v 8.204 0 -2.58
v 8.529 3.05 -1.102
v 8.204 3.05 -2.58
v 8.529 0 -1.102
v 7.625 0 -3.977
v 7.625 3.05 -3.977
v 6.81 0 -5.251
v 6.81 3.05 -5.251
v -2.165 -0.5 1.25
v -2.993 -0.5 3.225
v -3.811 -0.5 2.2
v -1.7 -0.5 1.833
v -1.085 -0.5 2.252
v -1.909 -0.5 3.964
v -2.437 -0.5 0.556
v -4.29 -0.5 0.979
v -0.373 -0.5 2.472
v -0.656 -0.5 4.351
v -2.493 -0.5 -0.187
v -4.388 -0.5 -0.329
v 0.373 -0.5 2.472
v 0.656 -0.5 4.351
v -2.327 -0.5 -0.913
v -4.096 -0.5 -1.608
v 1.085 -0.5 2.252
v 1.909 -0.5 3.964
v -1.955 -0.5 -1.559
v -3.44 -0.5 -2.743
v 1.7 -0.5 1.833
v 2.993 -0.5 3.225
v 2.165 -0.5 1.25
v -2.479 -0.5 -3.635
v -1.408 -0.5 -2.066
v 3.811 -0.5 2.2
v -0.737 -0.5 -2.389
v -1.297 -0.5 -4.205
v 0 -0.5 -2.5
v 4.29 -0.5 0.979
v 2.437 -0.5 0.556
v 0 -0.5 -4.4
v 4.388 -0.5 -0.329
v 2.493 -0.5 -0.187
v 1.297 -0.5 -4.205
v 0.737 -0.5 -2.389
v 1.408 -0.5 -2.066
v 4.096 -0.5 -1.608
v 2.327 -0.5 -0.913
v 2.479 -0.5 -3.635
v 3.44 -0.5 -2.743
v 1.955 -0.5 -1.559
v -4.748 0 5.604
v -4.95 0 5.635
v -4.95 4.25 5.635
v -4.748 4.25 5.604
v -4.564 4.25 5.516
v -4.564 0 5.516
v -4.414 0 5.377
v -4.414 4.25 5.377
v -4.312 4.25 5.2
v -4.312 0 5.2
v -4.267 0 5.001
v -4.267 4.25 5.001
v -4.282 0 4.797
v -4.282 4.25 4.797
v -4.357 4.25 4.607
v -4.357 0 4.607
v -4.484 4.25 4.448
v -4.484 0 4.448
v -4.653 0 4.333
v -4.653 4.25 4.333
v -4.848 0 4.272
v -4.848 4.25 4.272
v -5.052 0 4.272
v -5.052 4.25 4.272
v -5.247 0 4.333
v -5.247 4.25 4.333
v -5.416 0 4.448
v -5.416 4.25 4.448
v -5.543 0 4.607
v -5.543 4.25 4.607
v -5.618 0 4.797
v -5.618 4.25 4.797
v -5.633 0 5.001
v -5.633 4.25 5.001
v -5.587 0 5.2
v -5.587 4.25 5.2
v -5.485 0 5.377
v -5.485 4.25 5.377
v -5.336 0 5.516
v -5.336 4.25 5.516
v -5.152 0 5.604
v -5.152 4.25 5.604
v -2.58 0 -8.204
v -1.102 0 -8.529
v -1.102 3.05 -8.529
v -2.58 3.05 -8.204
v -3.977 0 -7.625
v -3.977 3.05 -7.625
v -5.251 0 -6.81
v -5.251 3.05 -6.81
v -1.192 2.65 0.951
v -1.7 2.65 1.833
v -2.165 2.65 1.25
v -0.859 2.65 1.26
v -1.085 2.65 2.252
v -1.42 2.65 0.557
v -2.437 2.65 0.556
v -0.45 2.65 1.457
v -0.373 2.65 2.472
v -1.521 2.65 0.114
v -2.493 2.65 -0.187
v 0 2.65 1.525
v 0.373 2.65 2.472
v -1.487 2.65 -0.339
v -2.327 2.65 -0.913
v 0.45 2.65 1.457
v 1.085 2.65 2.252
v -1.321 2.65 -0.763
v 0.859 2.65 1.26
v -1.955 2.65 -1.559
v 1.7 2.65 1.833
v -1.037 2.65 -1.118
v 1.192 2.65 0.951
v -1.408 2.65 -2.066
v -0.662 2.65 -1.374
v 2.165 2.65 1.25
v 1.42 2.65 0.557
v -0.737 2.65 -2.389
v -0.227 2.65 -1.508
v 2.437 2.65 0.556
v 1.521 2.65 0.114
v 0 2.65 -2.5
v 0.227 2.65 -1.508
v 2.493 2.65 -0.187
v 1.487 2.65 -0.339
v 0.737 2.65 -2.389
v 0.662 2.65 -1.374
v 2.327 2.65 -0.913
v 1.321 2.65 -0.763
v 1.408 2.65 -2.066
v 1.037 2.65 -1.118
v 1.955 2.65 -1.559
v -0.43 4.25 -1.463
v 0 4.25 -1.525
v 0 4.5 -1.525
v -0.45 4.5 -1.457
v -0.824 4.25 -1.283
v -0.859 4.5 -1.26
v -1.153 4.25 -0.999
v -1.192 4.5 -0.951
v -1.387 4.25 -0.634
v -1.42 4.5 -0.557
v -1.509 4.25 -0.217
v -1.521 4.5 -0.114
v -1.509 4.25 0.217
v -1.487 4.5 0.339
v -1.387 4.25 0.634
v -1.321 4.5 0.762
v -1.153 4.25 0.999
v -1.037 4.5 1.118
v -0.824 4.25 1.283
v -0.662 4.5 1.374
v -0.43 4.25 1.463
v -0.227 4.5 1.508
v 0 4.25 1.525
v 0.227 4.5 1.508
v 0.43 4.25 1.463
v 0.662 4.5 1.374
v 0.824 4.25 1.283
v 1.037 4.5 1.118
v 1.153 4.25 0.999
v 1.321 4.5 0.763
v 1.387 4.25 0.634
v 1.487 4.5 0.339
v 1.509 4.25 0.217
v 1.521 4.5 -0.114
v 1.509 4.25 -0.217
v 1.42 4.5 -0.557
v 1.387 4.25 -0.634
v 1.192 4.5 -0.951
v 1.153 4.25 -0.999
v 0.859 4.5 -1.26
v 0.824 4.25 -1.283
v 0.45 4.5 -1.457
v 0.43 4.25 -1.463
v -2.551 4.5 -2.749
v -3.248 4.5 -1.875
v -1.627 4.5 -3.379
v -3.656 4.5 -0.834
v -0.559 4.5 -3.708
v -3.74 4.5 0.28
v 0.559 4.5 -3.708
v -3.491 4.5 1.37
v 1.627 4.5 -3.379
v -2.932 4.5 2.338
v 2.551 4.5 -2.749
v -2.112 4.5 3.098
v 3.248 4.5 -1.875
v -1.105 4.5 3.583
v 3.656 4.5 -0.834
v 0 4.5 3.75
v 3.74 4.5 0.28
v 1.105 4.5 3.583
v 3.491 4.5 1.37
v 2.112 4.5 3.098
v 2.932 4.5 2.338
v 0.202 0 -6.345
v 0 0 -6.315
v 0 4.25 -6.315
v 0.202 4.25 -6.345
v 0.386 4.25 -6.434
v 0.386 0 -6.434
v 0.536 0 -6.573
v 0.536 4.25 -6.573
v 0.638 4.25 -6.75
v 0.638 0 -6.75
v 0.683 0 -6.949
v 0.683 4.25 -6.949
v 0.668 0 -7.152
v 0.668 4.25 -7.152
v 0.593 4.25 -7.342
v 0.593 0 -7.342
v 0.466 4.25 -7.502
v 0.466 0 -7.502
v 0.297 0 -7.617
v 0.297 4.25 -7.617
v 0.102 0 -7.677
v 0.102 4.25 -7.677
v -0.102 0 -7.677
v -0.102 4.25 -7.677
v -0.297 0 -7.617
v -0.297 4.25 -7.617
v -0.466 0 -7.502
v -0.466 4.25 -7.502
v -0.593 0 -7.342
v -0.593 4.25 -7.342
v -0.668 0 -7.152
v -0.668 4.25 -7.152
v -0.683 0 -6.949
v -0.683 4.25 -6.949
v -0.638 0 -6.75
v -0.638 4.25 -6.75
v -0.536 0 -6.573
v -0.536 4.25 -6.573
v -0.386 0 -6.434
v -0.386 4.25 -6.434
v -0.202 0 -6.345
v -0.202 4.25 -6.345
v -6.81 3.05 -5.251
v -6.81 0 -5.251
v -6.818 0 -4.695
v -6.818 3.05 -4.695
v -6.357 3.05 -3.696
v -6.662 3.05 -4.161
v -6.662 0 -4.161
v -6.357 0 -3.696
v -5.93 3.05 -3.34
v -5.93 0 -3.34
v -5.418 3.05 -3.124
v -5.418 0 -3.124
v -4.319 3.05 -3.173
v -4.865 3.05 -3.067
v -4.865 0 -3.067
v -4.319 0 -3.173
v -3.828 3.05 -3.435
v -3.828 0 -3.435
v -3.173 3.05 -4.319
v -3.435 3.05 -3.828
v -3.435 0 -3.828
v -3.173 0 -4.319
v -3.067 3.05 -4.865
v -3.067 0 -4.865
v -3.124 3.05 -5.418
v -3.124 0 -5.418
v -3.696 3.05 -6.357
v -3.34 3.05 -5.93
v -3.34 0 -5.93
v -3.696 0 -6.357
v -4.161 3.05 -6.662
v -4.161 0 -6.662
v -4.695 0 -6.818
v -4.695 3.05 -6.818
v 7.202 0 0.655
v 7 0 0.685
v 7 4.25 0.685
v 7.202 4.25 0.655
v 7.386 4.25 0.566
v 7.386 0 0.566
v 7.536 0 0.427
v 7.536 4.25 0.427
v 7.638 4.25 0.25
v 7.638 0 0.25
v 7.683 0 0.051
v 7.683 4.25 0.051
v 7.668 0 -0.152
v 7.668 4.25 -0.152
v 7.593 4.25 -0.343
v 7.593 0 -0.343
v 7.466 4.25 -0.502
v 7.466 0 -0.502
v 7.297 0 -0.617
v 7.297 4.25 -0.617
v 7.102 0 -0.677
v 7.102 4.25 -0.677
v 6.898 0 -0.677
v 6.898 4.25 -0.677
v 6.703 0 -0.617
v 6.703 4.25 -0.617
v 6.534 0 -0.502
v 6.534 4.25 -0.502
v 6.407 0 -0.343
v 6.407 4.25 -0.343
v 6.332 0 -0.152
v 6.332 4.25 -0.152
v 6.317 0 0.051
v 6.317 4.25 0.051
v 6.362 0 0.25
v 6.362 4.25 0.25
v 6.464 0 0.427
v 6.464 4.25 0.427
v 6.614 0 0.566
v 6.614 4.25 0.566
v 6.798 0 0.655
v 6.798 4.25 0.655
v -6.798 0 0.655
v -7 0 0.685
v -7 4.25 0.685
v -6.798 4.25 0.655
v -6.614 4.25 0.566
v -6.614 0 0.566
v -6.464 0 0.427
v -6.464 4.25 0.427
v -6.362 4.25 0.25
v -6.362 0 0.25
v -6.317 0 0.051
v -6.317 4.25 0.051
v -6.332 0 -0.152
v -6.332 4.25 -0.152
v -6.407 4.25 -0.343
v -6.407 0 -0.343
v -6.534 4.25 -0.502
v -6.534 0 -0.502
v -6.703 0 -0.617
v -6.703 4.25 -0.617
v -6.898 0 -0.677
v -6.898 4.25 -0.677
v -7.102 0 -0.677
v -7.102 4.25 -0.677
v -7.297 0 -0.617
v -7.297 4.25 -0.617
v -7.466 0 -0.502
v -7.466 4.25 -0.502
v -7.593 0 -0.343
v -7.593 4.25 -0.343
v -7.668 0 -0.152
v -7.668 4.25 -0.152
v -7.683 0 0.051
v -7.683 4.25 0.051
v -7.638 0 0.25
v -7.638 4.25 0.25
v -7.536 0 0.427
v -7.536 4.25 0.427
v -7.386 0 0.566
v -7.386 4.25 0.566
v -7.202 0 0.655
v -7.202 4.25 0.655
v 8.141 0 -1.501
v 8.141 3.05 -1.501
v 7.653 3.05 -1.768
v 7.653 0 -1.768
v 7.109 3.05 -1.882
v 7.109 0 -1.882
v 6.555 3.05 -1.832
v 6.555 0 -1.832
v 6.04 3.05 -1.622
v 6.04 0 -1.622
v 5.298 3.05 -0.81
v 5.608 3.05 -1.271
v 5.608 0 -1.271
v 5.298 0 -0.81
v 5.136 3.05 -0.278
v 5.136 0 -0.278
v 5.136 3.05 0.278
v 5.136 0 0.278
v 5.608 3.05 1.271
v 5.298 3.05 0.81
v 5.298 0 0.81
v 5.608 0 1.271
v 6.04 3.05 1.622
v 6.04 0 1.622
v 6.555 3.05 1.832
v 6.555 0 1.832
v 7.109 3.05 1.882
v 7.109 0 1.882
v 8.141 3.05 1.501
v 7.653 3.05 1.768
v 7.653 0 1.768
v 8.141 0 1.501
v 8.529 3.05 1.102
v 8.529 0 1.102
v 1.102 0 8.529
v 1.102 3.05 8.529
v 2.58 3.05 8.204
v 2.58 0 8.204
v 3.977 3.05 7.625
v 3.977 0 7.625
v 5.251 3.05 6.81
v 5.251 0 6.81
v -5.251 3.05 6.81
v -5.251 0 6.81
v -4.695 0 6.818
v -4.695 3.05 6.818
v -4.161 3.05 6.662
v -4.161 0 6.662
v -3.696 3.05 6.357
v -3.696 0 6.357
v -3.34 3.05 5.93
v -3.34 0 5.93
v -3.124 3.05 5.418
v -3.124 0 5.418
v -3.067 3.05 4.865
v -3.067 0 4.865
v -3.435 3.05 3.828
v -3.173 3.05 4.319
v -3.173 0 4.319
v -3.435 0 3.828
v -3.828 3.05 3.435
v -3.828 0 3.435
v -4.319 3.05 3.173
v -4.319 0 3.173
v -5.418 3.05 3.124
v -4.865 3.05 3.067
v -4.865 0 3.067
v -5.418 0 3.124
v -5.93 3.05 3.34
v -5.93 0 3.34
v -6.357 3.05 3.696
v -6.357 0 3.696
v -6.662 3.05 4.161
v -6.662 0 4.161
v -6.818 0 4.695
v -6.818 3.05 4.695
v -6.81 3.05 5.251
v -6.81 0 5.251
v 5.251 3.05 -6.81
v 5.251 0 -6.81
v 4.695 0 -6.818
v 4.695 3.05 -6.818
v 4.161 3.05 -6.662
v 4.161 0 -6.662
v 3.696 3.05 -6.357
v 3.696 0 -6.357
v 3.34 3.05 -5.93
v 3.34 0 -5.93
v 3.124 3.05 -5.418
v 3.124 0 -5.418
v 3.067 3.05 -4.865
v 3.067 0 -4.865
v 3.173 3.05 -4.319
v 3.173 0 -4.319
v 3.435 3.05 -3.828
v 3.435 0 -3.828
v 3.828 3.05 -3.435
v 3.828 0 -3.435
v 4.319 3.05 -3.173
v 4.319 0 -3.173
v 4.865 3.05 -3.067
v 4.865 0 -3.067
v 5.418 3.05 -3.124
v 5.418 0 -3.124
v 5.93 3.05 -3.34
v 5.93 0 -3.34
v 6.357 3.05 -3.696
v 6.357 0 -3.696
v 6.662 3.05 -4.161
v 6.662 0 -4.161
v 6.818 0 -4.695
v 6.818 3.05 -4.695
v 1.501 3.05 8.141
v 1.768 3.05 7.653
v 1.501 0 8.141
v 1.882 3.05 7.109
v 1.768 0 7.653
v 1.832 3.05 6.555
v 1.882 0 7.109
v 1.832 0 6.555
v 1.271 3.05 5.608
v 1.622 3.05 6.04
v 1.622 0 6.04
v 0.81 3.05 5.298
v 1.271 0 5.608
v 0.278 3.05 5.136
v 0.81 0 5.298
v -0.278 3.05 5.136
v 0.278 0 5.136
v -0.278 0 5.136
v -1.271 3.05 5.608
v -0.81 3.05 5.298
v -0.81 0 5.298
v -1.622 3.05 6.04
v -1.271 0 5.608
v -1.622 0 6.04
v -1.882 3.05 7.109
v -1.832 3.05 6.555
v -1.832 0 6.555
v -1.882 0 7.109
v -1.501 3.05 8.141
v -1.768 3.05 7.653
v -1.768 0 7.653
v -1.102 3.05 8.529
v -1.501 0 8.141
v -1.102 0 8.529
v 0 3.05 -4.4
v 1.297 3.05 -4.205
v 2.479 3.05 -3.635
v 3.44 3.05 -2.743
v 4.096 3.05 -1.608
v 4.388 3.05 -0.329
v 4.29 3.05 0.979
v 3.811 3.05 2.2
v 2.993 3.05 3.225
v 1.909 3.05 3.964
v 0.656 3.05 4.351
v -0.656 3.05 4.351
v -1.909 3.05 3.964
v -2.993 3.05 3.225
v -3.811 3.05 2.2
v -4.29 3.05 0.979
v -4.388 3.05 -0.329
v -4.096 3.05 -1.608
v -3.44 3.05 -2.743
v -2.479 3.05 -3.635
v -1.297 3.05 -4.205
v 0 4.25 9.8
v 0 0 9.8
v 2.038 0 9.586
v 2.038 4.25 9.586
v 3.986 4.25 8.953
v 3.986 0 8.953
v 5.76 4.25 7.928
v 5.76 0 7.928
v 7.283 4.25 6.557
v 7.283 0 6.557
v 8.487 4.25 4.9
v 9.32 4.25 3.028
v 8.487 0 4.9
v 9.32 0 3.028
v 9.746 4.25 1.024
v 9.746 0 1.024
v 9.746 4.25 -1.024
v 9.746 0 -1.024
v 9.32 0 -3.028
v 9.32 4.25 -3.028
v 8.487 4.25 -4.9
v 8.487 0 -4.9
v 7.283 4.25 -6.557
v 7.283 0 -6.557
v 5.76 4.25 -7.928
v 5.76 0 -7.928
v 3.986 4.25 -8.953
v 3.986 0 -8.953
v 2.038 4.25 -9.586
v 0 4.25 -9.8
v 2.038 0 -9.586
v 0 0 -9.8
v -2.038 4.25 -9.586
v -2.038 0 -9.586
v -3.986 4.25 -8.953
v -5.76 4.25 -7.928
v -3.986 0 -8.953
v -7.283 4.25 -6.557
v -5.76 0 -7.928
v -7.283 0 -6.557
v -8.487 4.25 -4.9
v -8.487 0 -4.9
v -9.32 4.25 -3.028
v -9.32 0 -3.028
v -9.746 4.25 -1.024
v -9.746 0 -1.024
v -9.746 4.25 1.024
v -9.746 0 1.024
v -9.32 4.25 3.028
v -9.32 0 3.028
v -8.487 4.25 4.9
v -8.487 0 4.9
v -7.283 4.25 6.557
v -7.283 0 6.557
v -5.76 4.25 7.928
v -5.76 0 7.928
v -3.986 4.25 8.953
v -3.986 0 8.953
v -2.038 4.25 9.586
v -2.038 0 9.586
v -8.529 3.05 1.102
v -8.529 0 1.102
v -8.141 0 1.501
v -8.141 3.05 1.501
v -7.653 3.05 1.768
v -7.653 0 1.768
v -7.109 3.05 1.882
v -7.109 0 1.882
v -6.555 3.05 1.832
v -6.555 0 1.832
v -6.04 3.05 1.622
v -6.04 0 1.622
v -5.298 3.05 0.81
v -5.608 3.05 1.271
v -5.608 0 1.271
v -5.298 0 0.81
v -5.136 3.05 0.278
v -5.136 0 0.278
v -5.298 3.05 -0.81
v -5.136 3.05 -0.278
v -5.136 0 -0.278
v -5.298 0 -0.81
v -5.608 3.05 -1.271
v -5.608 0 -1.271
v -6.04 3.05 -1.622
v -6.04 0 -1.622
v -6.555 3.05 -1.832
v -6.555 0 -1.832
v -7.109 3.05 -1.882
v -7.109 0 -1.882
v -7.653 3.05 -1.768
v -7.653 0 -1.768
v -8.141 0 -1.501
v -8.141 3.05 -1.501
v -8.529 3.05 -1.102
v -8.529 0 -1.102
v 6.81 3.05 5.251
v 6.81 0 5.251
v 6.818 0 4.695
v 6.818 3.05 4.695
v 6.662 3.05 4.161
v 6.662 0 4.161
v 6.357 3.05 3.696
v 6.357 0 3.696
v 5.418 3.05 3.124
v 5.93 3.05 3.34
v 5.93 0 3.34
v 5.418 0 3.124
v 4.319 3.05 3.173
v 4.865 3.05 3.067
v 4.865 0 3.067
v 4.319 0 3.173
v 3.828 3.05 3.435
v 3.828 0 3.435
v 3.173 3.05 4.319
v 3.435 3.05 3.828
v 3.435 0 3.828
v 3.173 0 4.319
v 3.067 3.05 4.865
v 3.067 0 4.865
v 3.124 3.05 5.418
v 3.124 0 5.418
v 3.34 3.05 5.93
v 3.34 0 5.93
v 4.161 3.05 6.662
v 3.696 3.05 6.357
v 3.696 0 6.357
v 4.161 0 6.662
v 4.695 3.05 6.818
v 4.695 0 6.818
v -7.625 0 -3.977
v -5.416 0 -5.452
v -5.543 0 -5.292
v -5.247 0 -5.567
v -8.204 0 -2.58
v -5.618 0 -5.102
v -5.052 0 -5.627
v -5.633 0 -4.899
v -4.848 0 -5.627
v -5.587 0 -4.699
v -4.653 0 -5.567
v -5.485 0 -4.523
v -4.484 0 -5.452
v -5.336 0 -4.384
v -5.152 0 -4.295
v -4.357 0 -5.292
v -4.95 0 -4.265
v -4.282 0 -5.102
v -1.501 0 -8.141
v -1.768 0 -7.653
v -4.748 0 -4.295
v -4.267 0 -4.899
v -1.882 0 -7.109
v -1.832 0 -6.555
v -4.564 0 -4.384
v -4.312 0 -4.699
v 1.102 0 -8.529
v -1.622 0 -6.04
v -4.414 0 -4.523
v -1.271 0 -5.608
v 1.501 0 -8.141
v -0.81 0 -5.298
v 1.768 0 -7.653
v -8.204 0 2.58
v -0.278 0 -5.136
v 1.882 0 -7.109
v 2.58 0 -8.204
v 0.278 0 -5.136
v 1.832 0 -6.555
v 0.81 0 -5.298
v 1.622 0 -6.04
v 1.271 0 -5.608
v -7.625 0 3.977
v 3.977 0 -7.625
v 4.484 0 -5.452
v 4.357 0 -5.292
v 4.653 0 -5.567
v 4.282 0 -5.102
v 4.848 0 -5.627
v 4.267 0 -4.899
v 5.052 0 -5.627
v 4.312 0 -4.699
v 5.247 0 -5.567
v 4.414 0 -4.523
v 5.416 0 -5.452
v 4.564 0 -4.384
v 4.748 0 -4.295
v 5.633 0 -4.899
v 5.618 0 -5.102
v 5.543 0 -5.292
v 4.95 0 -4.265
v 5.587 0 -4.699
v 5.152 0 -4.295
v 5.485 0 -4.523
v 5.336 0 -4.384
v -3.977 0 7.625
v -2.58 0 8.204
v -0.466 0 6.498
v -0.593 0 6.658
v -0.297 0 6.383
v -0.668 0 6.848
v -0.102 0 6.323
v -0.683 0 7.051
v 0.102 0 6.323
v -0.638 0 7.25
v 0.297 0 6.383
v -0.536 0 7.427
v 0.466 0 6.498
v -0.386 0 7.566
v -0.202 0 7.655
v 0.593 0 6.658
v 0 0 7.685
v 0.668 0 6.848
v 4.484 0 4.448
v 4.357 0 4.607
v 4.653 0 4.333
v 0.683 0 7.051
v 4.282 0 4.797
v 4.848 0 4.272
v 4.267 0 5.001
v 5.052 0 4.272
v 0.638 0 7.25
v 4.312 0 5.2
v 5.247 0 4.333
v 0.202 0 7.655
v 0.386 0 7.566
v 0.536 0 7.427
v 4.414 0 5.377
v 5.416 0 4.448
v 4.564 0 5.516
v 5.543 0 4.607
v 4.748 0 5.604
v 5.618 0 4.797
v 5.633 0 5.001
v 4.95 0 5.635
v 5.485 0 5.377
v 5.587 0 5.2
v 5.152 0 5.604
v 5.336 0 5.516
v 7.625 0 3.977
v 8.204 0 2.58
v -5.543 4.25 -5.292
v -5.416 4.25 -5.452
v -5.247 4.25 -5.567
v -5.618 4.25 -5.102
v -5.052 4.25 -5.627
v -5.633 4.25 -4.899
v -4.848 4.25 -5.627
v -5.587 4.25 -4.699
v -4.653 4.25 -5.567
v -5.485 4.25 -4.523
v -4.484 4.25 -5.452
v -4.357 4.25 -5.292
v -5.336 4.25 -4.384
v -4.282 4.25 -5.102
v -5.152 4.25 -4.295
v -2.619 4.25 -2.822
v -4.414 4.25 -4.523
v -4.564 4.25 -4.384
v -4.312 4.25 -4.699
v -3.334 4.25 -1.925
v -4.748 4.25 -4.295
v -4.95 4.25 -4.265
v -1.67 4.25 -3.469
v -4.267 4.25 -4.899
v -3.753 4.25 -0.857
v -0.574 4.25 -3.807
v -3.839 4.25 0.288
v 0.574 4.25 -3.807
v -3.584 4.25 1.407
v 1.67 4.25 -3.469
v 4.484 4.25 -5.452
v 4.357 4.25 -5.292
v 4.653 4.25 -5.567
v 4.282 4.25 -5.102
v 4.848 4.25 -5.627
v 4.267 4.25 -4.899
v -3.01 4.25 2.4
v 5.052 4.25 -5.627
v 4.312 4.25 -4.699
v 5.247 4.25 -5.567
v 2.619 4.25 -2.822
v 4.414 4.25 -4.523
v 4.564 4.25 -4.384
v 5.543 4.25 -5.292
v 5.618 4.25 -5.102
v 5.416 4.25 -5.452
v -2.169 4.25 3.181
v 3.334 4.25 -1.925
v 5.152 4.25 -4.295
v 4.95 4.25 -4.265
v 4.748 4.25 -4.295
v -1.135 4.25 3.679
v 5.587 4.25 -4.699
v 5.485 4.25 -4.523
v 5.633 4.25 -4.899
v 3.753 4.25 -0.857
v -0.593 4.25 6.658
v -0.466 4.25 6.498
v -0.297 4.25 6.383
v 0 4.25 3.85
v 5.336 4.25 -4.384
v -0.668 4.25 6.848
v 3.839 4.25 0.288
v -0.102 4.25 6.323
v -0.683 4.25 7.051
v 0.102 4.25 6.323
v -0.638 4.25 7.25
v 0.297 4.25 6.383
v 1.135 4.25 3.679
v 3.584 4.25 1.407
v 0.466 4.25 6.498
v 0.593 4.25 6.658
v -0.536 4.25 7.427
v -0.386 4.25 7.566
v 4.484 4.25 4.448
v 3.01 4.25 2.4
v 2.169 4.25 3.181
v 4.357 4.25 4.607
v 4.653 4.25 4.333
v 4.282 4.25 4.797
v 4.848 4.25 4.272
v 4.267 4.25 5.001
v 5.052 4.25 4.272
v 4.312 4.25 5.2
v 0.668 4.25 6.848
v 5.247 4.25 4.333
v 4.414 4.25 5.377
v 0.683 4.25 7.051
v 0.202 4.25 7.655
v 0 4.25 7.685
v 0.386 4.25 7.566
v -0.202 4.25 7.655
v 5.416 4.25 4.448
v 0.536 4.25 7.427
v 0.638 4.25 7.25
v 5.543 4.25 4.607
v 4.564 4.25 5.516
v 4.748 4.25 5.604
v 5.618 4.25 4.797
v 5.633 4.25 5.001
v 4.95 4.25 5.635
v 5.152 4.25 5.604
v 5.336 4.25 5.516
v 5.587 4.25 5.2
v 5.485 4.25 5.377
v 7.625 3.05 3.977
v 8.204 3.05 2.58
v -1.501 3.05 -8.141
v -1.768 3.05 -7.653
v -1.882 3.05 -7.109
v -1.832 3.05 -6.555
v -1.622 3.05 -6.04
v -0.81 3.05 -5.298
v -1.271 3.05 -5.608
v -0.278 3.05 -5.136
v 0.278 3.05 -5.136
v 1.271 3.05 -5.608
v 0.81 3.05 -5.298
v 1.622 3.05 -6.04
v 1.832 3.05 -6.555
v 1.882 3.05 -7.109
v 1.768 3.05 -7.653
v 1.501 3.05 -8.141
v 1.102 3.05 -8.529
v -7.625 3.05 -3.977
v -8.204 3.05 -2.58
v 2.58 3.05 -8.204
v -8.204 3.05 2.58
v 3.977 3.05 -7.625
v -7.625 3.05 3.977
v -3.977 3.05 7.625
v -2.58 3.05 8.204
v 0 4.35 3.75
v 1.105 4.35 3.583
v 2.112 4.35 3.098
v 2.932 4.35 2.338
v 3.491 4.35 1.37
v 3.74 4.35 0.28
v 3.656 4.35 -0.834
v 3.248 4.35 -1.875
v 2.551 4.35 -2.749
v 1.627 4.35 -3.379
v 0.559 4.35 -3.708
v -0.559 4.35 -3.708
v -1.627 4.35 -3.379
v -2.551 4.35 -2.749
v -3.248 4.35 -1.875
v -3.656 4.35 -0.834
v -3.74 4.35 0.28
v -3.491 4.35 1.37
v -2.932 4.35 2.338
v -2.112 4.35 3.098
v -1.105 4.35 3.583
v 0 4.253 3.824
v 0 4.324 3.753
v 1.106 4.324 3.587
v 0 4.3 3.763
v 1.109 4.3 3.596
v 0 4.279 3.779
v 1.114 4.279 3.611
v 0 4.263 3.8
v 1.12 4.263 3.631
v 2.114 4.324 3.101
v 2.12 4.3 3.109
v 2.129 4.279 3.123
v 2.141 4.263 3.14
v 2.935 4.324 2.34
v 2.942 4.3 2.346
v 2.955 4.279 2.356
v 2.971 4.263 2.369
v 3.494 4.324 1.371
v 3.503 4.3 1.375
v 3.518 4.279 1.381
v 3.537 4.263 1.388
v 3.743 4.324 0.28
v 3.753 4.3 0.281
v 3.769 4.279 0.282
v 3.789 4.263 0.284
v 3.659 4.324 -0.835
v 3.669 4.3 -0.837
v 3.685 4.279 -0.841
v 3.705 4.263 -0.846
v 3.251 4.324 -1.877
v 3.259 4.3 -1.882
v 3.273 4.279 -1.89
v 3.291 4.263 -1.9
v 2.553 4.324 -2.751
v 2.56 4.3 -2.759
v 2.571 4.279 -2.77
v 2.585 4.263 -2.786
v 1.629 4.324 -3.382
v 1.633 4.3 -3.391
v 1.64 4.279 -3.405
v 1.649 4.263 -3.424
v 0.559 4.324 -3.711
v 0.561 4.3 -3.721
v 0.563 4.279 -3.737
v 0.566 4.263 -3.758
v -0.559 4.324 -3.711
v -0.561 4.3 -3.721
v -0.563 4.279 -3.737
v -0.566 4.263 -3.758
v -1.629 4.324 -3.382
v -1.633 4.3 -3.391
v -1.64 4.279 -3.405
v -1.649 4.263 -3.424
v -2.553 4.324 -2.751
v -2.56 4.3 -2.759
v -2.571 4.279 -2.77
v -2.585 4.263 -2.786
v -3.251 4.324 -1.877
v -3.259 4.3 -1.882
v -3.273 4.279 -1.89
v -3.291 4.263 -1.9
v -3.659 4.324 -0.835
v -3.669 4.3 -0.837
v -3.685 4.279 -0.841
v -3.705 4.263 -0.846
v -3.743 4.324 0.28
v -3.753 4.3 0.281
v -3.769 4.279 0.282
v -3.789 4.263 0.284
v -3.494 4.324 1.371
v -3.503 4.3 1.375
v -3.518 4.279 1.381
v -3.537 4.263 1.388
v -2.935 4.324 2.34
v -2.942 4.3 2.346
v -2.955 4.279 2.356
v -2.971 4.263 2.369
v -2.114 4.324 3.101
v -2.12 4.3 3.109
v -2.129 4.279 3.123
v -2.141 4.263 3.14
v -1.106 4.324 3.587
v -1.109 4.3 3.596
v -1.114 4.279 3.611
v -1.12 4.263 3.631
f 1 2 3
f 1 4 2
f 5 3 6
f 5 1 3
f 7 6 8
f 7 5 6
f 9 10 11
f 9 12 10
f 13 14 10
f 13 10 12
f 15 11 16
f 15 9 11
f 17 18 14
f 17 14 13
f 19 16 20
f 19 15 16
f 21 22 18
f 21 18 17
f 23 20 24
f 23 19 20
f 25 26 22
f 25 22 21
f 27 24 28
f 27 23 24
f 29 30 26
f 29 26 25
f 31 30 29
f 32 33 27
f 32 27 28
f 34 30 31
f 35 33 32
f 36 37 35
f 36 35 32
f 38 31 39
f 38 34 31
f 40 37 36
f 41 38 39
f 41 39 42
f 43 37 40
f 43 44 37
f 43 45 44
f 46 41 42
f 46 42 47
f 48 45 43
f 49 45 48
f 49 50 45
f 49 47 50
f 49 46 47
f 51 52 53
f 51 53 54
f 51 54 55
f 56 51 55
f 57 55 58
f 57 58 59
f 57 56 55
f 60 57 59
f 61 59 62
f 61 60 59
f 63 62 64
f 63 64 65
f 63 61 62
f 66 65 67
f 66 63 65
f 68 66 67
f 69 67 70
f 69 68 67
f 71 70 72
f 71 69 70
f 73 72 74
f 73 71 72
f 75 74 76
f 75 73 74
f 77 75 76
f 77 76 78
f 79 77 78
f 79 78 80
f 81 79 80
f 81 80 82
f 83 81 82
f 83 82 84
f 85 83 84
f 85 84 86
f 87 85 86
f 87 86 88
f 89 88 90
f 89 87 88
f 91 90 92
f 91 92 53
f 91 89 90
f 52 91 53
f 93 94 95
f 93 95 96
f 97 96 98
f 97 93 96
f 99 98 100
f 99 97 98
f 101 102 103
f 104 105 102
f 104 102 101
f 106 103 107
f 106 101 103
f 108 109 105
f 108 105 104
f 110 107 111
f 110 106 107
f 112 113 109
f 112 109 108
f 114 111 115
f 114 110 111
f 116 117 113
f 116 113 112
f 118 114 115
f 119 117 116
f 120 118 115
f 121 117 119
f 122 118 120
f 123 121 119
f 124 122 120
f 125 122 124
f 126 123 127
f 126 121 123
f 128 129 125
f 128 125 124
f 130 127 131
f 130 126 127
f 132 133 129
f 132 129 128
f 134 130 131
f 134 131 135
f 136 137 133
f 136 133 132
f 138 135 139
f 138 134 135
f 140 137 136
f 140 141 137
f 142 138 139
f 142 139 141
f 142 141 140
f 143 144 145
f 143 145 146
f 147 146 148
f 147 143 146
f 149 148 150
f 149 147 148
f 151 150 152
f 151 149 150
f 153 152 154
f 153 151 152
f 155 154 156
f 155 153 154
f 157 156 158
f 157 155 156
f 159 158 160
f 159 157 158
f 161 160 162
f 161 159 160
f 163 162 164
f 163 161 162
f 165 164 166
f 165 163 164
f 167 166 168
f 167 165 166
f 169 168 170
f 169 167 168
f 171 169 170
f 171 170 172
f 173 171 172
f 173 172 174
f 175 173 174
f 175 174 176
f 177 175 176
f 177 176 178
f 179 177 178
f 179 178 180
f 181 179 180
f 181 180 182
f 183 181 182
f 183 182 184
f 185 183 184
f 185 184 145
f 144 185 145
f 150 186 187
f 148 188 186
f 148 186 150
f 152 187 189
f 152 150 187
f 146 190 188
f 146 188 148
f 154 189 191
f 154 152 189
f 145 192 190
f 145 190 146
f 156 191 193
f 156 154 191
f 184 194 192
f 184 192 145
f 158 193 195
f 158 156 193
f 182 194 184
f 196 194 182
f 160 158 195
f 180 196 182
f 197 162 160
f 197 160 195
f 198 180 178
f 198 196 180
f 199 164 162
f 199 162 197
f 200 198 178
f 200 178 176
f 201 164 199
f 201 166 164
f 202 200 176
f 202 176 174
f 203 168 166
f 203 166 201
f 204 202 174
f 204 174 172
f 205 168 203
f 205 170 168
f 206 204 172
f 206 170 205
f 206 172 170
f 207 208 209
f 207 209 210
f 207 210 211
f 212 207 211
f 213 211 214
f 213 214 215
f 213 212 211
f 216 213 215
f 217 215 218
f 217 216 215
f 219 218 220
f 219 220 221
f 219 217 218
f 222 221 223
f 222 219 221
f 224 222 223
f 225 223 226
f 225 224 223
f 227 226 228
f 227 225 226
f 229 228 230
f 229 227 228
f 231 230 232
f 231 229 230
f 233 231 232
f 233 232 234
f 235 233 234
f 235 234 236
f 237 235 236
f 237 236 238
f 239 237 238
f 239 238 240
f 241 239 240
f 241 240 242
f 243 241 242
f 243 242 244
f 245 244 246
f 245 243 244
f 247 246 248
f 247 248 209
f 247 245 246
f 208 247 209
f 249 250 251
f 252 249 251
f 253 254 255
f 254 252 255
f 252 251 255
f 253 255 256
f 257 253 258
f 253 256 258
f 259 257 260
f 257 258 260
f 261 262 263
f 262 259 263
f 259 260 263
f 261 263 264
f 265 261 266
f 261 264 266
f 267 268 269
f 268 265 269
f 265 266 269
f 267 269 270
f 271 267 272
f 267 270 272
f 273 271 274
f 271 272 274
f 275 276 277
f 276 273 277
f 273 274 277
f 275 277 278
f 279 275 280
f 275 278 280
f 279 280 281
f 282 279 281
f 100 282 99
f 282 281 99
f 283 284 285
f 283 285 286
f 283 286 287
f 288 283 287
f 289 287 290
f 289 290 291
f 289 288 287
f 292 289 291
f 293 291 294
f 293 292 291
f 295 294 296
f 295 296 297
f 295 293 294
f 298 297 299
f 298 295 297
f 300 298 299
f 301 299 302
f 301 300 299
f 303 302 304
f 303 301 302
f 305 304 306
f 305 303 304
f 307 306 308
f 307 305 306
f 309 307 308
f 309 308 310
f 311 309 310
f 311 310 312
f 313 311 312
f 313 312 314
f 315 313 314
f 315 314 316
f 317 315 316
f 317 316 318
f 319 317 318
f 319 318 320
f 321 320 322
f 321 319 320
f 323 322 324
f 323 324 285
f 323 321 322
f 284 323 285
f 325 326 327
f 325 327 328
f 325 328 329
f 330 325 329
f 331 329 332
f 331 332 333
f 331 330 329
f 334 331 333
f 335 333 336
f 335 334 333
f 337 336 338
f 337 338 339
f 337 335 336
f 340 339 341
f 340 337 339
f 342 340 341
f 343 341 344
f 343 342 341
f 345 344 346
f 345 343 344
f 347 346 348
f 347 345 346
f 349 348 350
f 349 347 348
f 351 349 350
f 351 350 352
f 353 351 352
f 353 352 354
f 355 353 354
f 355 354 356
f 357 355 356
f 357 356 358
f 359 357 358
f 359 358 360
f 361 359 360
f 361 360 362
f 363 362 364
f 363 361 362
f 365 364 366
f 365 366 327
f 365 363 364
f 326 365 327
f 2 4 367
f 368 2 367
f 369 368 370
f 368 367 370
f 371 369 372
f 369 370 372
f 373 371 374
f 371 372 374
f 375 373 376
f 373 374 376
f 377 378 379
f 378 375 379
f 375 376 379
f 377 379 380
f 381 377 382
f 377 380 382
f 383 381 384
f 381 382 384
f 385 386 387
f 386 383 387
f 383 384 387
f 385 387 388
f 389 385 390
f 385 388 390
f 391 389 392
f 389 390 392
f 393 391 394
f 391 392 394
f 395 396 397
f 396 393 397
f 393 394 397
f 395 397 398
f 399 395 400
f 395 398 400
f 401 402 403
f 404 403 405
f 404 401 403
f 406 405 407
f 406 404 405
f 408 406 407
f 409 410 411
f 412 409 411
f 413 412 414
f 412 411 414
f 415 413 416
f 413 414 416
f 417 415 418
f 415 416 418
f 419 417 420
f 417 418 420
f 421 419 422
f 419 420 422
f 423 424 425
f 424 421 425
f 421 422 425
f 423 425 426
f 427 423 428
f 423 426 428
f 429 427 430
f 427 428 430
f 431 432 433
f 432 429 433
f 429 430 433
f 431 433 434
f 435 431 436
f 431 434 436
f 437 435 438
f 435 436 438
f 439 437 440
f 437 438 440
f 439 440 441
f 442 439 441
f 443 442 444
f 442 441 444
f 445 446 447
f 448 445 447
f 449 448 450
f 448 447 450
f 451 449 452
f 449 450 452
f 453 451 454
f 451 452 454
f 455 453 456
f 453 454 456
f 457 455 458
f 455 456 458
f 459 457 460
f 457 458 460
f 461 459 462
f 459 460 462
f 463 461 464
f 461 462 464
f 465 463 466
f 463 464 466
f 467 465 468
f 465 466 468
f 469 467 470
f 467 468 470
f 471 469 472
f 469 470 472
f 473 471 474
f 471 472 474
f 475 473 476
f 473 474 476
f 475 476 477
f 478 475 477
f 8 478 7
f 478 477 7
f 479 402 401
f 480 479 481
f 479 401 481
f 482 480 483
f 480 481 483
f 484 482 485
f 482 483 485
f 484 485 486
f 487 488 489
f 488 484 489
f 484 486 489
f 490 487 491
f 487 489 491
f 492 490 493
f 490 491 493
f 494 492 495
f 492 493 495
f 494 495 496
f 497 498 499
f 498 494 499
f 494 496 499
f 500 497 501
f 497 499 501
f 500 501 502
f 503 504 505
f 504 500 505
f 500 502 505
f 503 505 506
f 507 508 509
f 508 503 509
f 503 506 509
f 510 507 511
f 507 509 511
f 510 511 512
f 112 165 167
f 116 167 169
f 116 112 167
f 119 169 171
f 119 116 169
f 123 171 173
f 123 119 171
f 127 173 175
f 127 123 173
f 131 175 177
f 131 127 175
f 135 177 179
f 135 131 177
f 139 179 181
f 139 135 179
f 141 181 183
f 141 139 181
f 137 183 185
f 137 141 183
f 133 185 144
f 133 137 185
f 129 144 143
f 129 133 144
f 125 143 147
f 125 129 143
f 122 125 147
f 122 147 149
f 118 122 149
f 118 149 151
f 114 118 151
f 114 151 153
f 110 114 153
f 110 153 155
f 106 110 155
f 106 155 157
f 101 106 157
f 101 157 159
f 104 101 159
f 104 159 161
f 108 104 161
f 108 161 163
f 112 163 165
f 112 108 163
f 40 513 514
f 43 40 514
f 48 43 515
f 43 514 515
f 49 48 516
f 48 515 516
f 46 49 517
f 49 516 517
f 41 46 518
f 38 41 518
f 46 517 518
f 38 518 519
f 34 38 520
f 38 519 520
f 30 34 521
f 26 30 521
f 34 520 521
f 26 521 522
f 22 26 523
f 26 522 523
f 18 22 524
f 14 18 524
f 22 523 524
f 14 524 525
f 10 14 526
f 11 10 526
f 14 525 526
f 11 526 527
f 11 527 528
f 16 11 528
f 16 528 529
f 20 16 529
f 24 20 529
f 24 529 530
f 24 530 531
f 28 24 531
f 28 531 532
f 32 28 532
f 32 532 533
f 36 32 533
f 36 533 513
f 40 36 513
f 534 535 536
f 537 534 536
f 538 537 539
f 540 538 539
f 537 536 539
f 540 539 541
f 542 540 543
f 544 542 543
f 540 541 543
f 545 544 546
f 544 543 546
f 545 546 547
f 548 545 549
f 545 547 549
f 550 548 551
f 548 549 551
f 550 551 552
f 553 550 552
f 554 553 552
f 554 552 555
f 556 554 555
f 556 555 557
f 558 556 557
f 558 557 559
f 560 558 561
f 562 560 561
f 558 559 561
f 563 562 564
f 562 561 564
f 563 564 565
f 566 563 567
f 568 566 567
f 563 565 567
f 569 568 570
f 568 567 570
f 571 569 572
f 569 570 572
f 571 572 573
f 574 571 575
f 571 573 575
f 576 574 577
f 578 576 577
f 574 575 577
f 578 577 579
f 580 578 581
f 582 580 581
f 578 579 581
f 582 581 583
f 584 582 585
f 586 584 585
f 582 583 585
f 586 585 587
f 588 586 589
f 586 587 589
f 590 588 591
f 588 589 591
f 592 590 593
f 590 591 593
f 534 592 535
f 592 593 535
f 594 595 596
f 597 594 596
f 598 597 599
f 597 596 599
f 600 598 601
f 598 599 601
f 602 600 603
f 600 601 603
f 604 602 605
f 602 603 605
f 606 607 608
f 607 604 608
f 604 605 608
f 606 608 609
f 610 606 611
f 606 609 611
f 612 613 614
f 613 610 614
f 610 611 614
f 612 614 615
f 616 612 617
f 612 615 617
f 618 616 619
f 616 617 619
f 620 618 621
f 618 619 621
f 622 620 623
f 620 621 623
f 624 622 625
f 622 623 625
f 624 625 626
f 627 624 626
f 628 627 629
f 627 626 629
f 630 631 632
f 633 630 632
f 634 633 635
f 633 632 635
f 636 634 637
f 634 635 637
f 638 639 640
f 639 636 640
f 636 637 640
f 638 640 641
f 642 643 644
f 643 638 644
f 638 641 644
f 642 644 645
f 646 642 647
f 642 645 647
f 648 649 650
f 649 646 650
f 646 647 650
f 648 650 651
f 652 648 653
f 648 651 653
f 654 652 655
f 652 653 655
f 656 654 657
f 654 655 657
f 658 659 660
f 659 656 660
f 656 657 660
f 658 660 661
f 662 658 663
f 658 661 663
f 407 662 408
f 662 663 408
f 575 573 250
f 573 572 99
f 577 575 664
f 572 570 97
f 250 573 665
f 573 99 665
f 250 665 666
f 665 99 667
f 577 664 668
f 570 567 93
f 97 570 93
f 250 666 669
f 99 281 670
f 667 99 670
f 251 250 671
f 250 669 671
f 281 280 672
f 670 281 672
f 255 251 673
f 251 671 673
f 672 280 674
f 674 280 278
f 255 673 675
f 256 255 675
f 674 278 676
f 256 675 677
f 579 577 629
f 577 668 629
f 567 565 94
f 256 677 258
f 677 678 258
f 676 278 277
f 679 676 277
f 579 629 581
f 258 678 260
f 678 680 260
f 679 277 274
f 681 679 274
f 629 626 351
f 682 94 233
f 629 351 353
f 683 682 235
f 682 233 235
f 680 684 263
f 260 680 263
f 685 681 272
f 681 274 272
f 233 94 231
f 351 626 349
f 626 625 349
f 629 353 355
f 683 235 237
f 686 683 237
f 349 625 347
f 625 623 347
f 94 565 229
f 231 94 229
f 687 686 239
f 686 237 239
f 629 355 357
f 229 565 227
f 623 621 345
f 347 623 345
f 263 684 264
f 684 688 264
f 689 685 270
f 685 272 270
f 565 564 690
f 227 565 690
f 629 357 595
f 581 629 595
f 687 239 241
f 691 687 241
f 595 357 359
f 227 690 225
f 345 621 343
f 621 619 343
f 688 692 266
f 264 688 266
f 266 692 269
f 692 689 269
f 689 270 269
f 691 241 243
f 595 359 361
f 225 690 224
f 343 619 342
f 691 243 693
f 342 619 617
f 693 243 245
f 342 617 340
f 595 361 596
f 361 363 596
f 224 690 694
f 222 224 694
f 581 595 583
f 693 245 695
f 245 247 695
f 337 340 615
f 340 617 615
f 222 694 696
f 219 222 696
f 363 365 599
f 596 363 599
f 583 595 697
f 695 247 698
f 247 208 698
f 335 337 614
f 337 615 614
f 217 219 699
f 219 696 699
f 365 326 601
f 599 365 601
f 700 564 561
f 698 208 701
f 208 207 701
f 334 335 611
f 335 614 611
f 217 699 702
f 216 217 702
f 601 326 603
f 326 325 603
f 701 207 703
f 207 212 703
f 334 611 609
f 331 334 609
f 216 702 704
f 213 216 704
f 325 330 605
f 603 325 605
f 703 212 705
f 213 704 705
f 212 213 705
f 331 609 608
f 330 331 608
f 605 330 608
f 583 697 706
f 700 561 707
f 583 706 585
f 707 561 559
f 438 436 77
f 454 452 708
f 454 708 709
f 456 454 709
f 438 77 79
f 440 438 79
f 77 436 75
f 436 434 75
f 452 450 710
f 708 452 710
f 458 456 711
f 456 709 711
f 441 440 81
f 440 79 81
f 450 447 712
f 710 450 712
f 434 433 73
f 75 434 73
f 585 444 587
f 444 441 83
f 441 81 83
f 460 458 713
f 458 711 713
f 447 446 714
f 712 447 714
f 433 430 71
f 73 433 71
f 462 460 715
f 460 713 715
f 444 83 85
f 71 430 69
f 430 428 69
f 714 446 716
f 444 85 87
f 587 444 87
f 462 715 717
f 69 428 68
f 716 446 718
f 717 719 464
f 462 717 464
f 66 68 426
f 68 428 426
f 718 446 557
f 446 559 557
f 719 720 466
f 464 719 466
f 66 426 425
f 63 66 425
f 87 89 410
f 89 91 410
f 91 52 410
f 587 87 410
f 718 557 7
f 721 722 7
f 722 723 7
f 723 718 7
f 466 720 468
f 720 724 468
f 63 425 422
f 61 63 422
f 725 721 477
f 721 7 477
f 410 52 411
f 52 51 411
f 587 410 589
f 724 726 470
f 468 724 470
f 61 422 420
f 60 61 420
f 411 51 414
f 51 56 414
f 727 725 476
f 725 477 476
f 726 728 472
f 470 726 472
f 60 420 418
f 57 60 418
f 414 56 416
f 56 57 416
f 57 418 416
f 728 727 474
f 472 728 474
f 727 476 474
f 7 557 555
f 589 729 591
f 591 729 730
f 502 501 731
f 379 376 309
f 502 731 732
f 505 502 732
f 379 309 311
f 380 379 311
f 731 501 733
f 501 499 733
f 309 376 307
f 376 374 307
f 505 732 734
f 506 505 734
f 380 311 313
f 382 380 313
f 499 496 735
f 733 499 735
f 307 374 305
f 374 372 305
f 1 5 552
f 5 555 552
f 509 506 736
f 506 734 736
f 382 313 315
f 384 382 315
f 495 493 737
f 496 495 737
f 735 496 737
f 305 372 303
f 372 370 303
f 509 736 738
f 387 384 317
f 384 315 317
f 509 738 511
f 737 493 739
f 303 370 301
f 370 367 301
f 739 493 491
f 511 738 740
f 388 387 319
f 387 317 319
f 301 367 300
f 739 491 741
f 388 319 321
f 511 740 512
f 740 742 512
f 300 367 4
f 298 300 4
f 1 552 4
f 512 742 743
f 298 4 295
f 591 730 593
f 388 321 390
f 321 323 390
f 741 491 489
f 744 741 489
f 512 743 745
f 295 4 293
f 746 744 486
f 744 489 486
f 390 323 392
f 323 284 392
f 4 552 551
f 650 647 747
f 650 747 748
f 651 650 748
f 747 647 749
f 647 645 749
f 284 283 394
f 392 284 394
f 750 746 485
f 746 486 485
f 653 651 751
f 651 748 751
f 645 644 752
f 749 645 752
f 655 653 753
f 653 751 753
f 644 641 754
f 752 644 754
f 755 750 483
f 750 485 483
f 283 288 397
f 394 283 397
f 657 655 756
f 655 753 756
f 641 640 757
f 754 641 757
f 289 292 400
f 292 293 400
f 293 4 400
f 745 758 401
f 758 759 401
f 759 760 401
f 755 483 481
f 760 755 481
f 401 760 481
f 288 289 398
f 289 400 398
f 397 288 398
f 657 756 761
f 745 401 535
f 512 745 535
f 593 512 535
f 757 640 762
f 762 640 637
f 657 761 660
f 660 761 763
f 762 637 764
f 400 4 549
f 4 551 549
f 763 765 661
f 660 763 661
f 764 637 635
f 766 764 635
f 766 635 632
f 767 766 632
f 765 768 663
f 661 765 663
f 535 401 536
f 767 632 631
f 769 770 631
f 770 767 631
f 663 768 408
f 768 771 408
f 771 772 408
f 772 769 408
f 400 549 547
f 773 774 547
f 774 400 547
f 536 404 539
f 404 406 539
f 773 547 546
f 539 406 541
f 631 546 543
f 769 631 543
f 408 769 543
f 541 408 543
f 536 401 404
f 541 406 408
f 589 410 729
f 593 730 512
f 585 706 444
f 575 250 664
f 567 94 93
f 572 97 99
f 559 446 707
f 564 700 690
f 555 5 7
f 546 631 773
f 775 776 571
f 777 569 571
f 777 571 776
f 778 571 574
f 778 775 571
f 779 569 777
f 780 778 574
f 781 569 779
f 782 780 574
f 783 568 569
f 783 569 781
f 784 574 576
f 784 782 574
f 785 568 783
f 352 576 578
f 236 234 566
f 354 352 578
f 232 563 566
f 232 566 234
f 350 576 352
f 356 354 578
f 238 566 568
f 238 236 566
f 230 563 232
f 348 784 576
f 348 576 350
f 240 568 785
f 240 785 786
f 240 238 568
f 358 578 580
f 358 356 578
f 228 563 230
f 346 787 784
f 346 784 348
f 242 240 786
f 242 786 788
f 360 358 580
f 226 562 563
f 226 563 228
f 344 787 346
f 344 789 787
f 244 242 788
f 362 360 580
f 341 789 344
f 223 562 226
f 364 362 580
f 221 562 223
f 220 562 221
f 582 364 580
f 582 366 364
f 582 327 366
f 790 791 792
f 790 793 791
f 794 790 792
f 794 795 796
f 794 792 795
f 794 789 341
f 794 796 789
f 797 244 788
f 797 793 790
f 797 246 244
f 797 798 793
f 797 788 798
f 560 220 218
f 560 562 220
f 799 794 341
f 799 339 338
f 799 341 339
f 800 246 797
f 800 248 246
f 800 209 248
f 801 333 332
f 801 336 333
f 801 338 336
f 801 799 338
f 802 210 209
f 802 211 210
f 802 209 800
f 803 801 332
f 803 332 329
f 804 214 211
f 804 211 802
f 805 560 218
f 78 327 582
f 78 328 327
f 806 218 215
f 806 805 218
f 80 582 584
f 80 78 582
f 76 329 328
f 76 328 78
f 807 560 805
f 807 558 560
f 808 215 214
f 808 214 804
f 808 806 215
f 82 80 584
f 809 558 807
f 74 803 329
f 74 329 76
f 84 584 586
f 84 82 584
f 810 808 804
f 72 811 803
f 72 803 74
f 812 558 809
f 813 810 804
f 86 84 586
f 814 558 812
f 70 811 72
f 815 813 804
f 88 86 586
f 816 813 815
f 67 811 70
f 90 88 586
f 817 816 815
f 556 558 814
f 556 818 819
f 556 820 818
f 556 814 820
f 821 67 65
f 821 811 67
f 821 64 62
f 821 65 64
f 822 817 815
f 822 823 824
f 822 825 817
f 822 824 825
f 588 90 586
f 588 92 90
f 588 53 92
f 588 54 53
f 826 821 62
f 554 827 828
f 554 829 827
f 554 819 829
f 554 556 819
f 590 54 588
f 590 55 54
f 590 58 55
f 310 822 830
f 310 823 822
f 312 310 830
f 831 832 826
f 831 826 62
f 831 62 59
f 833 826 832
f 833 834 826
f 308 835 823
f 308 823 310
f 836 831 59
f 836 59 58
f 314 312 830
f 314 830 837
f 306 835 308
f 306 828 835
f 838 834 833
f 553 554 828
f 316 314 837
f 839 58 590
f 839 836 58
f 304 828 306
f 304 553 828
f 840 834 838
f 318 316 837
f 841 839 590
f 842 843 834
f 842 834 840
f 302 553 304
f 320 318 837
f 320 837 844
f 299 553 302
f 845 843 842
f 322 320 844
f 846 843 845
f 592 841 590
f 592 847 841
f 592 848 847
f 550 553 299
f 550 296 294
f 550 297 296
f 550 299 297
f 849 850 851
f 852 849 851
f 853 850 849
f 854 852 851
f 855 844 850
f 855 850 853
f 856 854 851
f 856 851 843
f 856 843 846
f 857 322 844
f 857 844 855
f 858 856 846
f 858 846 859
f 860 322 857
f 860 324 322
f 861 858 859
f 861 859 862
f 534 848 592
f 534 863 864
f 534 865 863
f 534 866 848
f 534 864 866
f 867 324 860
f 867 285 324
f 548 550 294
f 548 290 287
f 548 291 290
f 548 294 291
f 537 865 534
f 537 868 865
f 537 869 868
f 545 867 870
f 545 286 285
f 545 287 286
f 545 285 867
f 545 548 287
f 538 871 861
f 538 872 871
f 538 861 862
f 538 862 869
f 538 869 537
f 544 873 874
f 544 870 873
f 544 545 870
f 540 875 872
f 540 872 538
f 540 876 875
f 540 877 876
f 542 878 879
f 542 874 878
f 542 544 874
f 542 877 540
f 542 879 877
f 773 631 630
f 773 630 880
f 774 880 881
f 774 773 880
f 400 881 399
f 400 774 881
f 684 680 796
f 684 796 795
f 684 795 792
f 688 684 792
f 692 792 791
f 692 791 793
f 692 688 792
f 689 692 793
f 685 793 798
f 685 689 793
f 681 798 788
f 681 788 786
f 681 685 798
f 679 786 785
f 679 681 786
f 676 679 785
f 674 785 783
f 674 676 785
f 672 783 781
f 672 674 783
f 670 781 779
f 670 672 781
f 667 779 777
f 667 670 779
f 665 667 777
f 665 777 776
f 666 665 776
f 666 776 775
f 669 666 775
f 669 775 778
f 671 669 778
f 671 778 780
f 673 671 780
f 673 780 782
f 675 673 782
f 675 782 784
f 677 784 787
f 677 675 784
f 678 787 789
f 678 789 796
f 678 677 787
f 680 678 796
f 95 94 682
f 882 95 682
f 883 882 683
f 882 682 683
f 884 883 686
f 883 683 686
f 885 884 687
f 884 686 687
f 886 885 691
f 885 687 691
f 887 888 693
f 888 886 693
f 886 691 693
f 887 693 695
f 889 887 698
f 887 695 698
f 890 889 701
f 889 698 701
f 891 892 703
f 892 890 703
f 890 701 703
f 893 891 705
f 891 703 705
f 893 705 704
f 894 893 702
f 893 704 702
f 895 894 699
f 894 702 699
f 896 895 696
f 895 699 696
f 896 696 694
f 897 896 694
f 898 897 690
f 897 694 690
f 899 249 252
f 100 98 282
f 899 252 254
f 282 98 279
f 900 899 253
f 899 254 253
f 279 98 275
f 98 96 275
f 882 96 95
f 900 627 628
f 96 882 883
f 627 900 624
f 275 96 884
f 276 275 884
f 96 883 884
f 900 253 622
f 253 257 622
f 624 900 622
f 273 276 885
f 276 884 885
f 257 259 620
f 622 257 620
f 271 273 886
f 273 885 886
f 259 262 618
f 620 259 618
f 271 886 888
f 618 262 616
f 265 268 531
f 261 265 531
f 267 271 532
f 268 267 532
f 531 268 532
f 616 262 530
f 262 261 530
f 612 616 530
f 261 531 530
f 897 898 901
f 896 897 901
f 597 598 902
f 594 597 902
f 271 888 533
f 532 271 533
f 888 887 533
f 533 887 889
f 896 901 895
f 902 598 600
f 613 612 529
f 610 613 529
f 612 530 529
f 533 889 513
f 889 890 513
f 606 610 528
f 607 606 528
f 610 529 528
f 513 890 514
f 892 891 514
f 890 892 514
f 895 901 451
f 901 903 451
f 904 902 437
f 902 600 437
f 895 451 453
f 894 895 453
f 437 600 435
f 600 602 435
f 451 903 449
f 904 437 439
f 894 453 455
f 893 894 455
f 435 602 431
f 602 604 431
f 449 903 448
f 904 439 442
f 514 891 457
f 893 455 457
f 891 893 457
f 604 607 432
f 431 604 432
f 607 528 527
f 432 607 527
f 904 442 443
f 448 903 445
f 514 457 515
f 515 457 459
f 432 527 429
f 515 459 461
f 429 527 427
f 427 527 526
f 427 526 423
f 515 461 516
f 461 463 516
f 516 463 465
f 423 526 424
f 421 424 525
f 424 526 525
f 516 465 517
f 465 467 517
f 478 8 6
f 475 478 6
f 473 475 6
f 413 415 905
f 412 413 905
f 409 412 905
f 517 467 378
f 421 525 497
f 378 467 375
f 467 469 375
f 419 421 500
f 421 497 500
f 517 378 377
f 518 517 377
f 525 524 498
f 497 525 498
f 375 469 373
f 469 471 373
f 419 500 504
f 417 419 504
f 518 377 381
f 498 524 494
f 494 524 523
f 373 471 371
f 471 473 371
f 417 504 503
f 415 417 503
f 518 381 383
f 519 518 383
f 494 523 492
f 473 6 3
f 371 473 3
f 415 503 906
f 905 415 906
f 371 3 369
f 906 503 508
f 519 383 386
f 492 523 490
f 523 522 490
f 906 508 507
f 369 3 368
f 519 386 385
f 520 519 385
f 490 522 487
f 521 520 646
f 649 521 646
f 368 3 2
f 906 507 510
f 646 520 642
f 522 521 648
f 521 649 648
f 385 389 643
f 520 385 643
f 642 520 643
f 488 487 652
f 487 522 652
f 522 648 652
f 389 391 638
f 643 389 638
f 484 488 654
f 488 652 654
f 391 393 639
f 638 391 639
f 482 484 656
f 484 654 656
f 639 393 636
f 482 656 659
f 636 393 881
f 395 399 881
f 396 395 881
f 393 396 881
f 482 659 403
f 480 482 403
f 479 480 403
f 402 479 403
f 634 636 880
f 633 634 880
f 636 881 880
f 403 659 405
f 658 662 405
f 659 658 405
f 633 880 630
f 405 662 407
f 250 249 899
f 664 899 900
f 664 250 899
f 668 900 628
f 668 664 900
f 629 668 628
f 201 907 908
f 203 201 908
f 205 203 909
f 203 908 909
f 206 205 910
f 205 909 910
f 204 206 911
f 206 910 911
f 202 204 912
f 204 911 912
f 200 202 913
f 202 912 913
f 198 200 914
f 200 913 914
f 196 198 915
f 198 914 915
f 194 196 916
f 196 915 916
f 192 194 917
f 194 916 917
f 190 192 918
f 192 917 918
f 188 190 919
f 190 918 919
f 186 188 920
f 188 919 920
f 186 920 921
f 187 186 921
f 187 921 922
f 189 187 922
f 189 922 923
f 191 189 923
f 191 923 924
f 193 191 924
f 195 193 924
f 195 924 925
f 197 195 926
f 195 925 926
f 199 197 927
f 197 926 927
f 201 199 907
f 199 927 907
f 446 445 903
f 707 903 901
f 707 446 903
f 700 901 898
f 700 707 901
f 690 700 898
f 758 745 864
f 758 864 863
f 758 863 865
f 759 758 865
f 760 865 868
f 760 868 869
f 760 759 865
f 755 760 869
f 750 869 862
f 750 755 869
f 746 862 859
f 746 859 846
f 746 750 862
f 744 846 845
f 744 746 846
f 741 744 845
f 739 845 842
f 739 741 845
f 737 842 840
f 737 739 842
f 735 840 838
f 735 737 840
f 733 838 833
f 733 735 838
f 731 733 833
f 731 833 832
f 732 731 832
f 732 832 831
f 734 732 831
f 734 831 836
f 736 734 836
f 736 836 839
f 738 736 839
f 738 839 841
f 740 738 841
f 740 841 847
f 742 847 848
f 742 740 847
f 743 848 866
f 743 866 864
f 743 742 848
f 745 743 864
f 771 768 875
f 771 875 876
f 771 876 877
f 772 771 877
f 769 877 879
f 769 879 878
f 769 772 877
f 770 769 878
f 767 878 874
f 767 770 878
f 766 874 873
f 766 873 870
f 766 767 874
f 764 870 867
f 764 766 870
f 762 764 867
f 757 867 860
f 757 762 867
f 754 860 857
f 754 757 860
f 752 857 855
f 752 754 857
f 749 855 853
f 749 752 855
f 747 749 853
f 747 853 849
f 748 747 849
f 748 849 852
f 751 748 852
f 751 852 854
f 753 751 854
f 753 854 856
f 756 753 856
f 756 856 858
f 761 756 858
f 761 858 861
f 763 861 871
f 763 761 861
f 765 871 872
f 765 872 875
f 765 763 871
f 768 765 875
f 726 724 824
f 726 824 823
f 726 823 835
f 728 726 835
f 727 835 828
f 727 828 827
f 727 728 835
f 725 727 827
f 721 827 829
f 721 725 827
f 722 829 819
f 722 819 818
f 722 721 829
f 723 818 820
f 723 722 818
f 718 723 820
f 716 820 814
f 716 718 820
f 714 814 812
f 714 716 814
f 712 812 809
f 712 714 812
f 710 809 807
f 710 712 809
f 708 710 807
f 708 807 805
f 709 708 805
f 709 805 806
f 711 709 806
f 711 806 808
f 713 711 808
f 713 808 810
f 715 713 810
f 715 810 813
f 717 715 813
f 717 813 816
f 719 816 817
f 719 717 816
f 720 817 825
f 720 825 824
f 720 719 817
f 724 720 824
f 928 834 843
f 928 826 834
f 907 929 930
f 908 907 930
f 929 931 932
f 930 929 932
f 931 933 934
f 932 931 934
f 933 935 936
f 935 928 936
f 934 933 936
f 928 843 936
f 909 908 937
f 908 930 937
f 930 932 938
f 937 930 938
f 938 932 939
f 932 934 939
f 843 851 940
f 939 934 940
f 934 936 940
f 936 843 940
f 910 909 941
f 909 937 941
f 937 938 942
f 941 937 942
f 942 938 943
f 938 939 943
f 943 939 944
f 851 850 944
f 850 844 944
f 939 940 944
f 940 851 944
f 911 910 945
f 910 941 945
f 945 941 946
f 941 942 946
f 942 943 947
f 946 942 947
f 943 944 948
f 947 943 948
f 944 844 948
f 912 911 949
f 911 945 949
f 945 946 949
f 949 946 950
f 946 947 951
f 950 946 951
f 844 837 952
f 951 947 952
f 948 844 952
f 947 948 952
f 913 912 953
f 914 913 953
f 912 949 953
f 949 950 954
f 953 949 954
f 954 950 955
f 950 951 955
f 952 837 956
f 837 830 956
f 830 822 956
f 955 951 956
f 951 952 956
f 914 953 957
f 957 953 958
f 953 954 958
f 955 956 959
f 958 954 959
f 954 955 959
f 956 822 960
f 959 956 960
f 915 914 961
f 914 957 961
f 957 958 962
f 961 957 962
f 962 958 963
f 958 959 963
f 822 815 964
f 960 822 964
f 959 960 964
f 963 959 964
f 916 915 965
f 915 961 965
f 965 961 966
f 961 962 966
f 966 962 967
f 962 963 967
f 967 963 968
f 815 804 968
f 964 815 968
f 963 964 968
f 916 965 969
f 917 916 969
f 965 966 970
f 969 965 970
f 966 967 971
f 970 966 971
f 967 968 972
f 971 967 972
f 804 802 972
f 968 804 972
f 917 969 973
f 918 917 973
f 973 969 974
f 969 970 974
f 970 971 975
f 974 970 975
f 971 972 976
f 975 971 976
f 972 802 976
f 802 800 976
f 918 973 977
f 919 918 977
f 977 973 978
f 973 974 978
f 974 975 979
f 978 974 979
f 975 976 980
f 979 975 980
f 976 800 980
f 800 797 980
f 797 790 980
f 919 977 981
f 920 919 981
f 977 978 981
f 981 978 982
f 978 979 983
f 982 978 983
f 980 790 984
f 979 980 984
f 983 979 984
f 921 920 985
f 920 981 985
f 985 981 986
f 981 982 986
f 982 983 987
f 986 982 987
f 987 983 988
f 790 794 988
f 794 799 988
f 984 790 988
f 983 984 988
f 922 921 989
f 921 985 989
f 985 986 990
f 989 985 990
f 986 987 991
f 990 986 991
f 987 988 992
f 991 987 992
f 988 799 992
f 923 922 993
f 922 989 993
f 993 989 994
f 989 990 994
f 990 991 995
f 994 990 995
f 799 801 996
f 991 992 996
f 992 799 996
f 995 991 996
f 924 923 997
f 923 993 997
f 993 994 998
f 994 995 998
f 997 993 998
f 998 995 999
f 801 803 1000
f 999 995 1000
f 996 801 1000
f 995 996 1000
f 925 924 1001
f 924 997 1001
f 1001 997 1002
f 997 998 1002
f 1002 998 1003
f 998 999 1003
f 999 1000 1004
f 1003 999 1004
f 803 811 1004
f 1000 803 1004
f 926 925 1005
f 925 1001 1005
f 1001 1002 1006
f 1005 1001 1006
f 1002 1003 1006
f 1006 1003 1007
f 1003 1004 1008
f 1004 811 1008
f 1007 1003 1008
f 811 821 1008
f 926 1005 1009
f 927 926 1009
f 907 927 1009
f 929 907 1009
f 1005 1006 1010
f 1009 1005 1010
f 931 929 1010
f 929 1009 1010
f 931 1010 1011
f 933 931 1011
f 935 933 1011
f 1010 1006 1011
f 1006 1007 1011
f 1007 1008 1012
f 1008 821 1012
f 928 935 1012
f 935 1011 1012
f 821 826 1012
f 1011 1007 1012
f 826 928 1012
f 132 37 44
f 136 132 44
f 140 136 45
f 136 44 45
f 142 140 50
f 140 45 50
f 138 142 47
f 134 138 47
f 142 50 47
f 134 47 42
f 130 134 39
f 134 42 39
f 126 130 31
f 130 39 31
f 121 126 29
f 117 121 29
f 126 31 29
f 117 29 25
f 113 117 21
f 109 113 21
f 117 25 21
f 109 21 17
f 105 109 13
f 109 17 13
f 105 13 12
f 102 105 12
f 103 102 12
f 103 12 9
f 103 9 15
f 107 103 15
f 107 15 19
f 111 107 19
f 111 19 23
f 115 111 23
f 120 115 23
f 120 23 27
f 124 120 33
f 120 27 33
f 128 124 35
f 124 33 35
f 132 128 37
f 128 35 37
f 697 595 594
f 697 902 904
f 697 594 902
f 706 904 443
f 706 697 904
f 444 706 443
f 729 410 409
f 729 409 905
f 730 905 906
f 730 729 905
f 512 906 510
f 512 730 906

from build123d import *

# Parameters (mm, degrees)
SKETCH1_R                = 9.8
SKETCH1_R_2              = 0.685
SKETCH1_R_3              = 1.525
BOSS_EXTRUDE1_DEPTH      = 4.25
SHELL3_T                 = -1.2
BOSS_EXTRUDE2_DEPTH      = 0.5
BOSS_EXTRUDE2_DEPTH_BACK = 4.25
SKETCH2_R                = 4.4
SKETCH2_R_2              = 1.525
SKETCH3_R                = 2.5
CUT_EXTRUDE1_DEPTH       = 3.15
SKETCH4_R                = 3.75
SKETCH4_R_2              = 1.525
BOSS_EXTRUDE3_DEPTH      = 0.25
FILLET1_R                = 0.1


with BuildPart() as part:
    # Sketch1 → Boss-Extrude1 (new body)
    with BuildSketch(Plane(origin=(0, 0, 0), x_dir=(1, 0, 0), z_dir=(0, 1, 0))):
        with Locations(Location((0, 0, 0), (0, 0, 270))):
            Circle(SKETCH1_R)
        with Locations(Location((0, 7, 0), (0, 0, 270))):
            Circle(SKETCH1_R_2, mode=Mode.SUBTRACT)
        with Locations(Location((4.949747468, 4.949747468, 0), (0, 0, 270))):
            Circle(SKETCH1_R_2, mode=Mode.SUBTRACT)
        with Locations(Location((7, 0, 0), (0, 0, 270))):
            Circle(SKETCH1_R_2, mode=Mode.SUBTRACT)
        with Locations(Location((4.949747468, -4.949747468, 0), (0, 0, 270))):
            Circle(SKETCH1_R_2, mode=Mode.SUBTRACT)
        with Locations(Location((0, -7, 0), (0, 0, 270))):
            Circle(SKETCH1_R_2, mode=Mode.SUBTRACT)
        with Locations(Location((-4.949747468, -4.949747468, 0), (0, 0, 270))):
            Circle(SKETCH1_R_2, mode=Mode.SUBTRACT)
        with Locations(Location((-7, 0, 0), (0, 0, 270))):
            Circle(SKETCH1_R_2, mode=Mode.SUBTRACT)
        with Locations(Location((-4.949747468, 4.949747468, 0), (0, 0, 270))):
            Circle(SKETCH1_R_2, mode=Mode.SUBTRACT)
        with Locations(Location((0, 0, 0), (0, 0, 270))):
            Circle(SKETCH1_R_3, mode=Mode.SUBTRACT)
    extrude(amount=BOSS_EXTRUDE1_DEPTH)

    # Shell3
    shell3_openings = [part.faces().sort_by_distance(p)[0] for p in [
        (0, 0, -9.522814142),
    ]]
    offset(amount=SHELL3_T, openings=shell3_openings)

    # Sketch2 → Boss-Extrude2 (add, two sides: drawn at the far end of the back side and taken through both)
    with BuildSketch(Plane.XZ.offset(-BOSS_EXTRUDE2_DEPTH_BACK)):
        with Locations(Location((0, 0, 0), (0, 0, 270))):
            Circle(SKETCH2_R)
        with Locations(Location((0, 0, 0), (0, 0, 270))):
            Circle(SKETCH2_R_2, mode=Mode.SUBTRACT)
    extrude(amount=BOSS_EXTRUDE2_DEPTH + BOSS_EXTRUDE2_DEPTH_BACK)

    # Sketch3 → Cut-Extrude1 (cut)
    with BuildSketch(Plane.XZ.offset(0.5)):
        with Locations(Location((0, 0, 0), (0, 0, 270))):
            Circle(SKETCH3_R)
    extrude(amount=-CUT_EXTRUDE1_DEPTH, mode=Mode.SUBTRACT)

    # Sketch4 → Boss-Extrude3 (add)
    with BuildSketch(Plane(origin=(0, 4.25, 0), x_dir=(1, 0, 0), z_dir=(0, 1, 0))):
        with Locations(Location((0, 0, 0), (0, 0, 270))):
            Circle(SKETCH4_R)
        with Locations(Location((0, 0, 0), (0, 0, 90))):
            Circle(SKETCH4_R_2, mode=Mode.SUBTRACT)
    extrude(amount=BOSS_EXTRUDE3_DEPTH)

    # Fillet1
    fillet1_edges = [part.edges().sort_by_distance(p)[0] for p in [
        (0, 4.25, -3.75),
    ]]
    fillet(fillet1_edges, radius=FILLET1_R)


solid = part.part
